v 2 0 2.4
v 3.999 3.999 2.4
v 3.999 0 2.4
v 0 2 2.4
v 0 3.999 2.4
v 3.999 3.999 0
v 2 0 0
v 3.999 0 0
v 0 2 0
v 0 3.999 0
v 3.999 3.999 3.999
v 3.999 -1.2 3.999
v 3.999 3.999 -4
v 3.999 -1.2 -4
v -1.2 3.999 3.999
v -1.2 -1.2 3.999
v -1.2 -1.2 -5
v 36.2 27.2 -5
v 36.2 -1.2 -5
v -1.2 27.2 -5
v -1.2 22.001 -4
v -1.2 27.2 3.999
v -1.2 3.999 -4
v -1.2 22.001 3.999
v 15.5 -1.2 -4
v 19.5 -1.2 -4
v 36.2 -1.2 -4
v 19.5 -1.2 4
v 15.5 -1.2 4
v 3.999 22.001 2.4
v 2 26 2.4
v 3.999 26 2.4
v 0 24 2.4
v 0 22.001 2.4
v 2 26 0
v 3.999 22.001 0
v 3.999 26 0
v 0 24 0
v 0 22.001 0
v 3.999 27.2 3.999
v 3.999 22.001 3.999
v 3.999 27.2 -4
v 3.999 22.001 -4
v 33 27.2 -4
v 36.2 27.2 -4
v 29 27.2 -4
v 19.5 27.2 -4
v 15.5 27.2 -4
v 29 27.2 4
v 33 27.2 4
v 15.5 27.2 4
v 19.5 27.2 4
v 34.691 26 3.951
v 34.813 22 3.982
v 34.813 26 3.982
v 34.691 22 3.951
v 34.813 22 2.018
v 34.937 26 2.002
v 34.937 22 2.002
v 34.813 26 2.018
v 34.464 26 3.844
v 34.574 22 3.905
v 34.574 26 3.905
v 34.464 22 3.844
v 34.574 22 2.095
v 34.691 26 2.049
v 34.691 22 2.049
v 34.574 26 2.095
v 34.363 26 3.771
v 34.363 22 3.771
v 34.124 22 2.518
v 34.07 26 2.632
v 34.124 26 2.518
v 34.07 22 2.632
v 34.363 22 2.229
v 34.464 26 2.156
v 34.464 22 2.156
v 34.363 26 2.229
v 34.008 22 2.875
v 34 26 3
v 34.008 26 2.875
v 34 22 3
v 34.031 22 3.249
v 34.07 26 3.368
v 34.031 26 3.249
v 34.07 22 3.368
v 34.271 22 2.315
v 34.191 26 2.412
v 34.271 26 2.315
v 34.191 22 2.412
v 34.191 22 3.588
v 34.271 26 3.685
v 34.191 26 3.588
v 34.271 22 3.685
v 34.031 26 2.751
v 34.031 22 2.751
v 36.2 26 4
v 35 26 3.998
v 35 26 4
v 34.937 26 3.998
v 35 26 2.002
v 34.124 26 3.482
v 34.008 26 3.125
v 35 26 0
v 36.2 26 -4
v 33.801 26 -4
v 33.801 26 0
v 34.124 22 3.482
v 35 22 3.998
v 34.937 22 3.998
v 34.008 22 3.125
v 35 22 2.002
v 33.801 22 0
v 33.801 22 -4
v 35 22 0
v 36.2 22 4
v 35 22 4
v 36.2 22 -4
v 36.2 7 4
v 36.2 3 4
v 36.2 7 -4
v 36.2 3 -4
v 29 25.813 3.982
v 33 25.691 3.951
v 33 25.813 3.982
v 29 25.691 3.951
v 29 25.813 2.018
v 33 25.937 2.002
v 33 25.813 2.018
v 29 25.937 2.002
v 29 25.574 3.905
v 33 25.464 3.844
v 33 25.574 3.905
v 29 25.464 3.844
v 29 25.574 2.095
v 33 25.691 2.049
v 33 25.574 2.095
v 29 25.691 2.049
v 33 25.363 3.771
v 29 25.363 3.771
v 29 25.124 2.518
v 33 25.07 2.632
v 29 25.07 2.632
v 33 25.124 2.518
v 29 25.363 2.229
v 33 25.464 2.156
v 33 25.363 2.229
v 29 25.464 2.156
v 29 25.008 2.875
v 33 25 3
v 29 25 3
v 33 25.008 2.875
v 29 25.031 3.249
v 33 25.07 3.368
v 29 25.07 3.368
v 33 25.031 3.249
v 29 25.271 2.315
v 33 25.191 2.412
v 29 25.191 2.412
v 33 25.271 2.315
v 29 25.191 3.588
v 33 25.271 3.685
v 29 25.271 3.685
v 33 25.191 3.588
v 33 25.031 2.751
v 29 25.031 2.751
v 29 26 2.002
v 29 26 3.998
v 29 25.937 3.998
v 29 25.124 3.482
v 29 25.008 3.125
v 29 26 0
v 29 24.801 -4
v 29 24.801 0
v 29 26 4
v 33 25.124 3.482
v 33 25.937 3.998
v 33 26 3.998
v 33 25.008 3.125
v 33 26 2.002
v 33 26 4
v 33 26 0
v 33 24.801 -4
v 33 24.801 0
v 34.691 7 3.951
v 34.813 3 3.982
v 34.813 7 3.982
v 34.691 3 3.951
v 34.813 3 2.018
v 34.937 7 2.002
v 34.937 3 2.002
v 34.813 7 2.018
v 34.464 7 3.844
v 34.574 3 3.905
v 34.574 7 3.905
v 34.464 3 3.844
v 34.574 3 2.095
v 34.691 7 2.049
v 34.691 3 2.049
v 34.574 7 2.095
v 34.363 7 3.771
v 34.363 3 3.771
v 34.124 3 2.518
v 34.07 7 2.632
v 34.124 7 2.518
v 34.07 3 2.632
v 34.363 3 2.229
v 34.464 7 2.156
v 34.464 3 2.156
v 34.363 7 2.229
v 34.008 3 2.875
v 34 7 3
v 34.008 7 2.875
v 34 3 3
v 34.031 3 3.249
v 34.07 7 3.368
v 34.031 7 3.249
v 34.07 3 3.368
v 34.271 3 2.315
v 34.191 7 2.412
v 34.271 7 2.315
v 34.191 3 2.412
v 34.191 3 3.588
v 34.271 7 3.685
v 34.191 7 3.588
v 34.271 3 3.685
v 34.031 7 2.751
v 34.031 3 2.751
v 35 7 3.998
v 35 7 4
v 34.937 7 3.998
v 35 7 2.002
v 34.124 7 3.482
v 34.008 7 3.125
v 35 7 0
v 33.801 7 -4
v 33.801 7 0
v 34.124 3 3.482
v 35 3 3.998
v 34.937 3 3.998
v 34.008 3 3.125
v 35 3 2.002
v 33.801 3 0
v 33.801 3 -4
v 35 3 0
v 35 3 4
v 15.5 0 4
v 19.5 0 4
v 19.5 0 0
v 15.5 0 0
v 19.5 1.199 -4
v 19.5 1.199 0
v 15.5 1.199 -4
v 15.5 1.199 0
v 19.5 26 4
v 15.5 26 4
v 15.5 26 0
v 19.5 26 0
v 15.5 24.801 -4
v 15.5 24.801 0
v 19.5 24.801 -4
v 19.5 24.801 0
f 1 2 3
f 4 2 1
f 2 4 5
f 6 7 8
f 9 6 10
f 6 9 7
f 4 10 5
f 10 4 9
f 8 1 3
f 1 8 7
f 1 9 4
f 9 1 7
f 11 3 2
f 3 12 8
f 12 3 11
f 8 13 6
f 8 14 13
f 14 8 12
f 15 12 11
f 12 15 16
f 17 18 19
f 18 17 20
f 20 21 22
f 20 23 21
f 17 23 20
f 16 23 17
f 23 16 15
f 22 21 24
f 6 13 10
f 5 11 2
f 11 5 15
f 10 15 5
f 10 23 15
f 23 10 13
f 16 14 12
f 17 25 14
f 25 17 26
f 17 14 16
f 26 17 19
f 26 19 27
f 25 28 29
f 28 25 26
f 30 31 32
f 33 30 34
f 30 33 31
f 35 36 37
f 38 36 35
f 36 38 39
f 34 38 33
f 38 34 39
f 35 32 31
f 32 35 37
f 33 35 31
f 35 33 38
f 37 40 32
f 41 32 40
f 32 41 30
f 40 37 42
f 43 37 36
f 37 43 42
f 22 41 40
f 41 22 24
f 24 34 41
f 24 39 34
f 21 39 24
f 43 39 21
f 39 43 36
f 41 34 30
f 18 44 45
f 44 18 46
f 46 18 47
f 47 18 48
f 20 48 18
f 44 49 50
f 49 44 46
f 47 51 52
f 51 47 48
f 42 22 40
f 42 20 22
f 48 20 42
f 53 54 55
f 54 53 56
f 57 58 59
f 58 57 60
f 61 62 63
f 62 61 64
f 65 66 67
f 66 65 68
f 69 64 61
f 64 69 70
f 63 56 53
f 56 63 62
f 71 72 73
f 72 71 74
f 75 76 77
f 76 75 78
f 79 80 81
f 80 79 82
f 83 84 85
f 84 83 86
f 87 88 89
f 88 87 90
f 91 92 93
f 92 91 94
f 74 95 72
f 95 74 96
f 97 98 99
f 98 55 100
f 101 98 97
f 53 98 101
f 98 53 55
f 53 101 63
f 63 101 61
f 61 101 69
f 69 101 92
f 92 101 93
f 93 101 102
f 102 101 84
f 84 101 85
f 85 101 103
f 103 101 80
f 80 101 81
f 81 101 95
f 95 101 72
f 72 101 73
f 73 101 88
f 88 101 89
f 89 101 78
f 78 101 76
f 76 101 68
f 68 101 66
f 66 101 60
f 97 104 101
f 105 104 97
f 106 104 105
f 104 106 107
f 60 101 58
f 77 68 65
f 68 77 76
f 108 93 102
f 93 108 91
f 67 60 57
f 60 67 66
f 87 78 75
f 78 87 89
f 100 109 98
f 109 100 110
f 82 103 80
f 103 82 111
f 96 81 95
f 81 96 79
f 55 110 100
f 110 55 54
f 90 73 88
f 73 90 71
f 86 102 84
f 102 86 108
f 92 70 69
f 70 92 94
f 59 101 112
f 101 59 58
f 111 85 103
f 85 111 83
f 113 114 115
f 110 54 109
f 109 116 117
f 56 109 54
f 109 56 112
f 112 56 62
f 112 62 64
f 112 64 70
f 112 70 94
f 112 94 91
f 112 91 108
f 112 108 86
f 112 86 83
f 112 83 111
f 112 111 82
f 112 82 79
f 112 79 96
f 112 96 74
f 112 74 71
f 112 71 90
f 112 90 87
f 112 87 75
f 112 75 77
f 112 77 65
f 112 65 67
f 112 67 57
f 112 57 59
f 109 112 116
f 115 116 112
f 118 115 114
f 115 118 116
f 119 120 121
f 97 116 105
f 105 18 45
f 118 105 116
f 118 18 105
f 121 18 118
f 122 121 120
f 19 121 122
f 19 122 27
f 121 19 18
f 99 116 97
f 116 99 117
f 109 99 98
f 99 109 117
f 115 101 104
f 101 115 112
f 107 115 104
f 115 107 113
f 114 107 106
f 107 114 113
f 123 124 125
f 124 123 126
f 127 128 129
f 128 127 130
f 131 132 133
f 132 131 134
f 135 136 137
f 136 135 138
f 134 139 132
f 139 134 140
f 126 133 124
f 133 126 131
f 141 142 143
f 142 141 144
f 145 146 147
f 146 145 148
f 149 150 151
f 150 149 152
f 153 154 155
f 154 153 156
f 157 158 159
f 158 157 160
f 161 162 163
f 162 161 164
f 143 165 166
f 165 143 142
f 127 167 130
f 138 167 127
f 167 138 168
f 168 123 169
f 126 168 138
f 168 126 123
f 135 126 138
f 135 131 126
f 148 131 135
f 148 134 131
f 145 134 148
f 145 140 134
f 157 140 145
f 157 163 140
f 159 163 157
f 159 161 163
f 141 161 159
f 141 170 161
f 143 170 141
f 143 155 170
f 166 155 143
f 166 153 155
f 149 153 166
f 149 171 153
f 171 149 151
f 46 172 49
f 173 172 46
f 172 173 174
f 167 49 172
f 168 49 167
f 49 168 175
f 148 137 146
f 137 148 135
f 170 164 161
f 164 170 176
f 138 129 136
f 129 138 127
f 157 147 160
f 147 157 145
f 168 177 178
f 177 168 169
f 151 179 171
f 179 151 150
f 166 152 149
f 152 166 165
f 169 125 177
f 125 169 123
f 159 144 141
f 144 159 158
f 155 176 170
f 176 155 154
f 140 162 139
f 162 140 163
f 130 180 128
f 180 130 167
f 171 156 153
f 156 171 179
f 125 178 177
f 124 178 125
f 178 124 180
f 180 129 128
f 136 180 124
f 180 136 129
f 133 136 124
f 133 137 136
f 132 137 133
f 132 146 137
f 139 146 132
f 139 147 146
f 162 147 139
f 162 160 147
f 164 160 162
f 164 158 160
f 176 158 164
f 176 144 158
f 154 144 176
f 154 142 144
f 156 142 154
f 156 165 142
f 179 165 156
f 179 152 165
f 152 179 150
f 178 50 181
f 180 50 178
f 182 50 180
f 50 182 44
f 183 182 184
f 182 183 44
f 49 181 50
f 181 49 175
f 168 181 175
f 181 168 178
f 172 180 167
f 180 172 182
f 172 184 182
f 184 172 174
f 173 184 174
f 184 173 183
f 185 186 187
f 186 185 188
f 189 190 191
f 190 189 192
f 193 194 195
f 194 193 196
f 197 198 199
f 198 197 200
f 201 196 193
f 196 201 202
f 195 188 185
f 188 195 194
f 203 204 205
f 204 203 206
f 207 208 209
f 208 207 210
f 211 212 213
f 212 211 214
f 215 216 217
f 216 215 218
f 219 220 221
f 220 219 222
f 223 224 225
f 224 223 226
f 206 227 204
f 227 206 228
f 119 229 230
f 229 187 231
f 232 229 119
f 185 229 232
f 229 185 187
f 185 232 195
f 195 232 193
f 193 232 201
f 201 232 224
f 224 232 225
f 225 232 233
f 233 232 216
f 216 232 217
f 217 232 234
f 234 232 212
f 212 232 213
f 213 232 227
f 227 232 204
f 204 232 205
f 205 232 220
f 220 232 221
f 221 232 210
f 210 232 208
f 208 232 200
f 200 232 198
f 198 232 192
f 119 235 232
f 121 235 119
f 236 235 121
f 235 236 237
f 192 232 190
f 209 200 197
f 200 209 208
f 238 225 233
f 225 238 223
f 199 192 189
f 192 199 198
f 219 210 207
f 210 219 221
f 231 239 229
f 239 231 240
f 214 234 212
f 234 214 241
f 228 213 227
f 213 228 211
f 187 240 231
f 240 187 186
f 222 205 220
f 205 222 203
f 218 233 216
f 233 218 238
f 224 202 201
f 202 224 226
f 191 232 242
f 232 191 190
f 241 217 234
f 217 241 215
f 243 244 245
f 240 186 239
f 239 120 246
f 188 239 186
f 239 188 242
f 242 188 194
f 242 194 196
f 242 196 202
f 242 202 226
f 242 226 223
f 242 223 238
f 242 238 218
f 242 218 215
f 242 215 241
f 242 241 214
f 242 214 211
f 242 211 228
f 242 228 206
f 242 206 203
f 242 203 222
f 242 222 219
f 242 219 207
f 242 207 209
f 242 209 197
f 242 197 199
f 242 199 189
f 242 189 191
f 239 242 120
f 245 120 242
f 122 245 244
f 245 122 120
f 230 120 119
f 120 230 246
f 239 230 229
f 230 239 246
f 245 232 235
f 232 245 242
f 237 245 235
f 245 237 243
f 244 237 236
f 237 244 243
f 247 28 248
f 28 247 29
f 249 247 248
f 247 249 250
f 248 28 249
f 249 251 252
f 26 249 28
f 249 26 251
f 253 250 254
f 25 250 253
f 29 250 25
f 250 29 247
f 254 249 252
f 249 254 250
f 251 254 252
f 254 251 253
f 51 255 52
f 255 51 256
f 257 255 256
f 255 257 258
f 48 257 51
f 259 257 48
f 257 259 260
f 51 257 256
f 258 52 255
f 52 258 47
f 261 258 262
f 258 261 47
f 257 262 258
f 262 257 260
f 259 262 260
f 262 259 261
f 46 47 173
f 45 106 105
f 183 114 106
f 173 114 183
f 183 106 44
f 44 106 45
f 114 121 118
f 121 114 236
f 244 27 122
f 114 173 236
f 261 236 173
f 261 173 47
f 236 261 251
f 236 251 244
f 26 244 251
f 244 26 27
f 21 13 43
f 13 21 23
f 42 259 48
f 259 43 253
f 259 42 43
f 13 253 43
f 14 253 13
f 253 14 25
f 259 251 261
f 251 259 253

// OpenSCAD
// Copyright (C) Danny Havenith 2020
// This design is licensed under the Creative Commons - Attribution license
// See https://creativecommons.org/licenses/by/4.0/
//
// usage: in your project file add:
//    use <wemos_d1_mini_clip.scad>
// Then call:
//    wemos_d1_mini_clip( some_offset);
// This will add the necessary clips to hold the pcb in place.
// offset is the height of the bottom of the pcb from the bottom of the clips, 
// or in other words: the height of the clips.
// The clips are placed to have the bottom side of one of the corners of the PCB at [0,0,0]
//
// The clips are placed "in mid air", you still need to have some ground plate
// to attach the clips to. This is demonstrated in the module demo().
// 
wemos_d1_pcb_width = 26;
wemos_d1_pcb_length = 35;
wemos_d1_pcb_thickness = 2;
wemos_d1_thin_wall = 1.2;
wemos_d1_clip = 1; // radius of the wemos_d1_clip that sticks out at the top of a pillar.
wemos_d1_tab_width = 4;


/**
* essentially a cube with one of the edges cut off.
*/
module edged_box()
{
    rib = 4;
    sag = .4;
    dims = [rib,rib,wemos_d1_pcb_thickness+sag];
    edge_off = 2;
    d = .001;
    d3 = [d,d,d];
    // somewhat convoluted, but it works
    mirror([0,1,0]) translate( [0, -rib, 0])
    difference()
    {
        cube( dims);
        translate([0,rib-edge_off,-d]) 
            rotate([0,0,45]) cube(dims + 2*d3);
    }
}

/**
* Pillar that holds the NE,NW corners of the PCB (the dull-edged corners)
*/
module frame_corner( height)
{
    wemos_d1_thin_wall = 1.2;
    wemos_d1_clip = 1;
    d3 = [.001, .001, .001];
    edge = wemos_d1_pcb_thickness + 2*wemos_d1_clip;
    pillar_dims = [4,4,height + edge] + [wemos_d1_thin_wall, wemos_d1_thin_wall, 0] - d3;

    difference()
    {
        translate([-wemos_d1_thin_wall,-wemos_d1_thin_wall,-height]) cube (pillar_dims);
        edged_box();
    }
}
/**
* A pillar that keeps the edge of the PCB in place. If doClip is true, 
* there will be a little tab at the top of the pillar to push the PCB down.
*/
module pillar( height, doClip=true)
{
    d = .001;
    edge = wemos_d1_pcb_thickness + 2*wemos_d1_clip;
    tab_dims = [wemos_d1_thin_wall, 4, height + edge];
    if (doClip)
    {
        translate([0,-wemos_d1_tab_width/2,edge - wemos_d1_clip]) rotate([90,0,0]) cylinder(h = wemos_d1_tab_width, r = wemos_d1_clip, center=true, $fn = 50);
    }
    translate([0,-wemos_d1_tab_width,-height]) cube( tab_dims);
    translate([-wemos_d1_thin_wall+d, -wemos_d1_tab_width, -height]) cube([wemos_d1_thin_wall, wemos_d1_tab_width, height]);
}

/** 
* clip to hold a wemos d1 mini
* This module can be used in enclosures. It generates clips that can
* hold a Wemos D1 Mini in place
**/
module wemos_d1_mini_clip( offset = 5)
{

    // frame corners on the NW, NE side
    frame_corner( offset);
    translate([0, wemos_d1_pcb_width, 0]) mirror([0,1,0]) frame_corner(offset);
    
    //two tabs supporting the SE side
    translate([wemos_d1_pcb_length, wemos_d1_pcb_width, 0]) pillar(offset);
    translate([wemos_d1_pcb_length-wemos_d1_tab_width - 2*wemos_d1_clip, wemos_d1_pcb_width, 0]) rotate([0,0,90]) pillar(offset);
    
    // one pillar supporting the SW side (keep the west open for the reset button)
    translate([wemos_d1_pcb_length, wemos_d1_tab_width+3, 0]) pillar(offset);
    
    // two extra tabs holding the sides in the E and W position
    translate([wemos_d1_pcb_length + wemos_d1_tab_width, 0, 0] * .5) rotate([0,0,-90]) pillar( offset, false);
    translate([(wemos_d1_pcb_length - wemos_d1_tab_width)/2, wemos_d1_pcb_width, 0] )rotate([0,0,90]) pillar( offset, false);
}

module wemos_d1_mini_demo()
{
    offset = 5;

    wemos_d1_mini_clip( offset);
    
    // bottom to hold it all together
    translate([-wemos_d1_thin_wall, -wemos_d1_thin_wall,-offset]) cube([ wemos_d1_pcb_length, wemos_d1_pcb_width, 1] + 2*[wemos_d1_thin_wall, wemos_d1_thin_wall,0]);
}

wemos_d1_mini_demo();
